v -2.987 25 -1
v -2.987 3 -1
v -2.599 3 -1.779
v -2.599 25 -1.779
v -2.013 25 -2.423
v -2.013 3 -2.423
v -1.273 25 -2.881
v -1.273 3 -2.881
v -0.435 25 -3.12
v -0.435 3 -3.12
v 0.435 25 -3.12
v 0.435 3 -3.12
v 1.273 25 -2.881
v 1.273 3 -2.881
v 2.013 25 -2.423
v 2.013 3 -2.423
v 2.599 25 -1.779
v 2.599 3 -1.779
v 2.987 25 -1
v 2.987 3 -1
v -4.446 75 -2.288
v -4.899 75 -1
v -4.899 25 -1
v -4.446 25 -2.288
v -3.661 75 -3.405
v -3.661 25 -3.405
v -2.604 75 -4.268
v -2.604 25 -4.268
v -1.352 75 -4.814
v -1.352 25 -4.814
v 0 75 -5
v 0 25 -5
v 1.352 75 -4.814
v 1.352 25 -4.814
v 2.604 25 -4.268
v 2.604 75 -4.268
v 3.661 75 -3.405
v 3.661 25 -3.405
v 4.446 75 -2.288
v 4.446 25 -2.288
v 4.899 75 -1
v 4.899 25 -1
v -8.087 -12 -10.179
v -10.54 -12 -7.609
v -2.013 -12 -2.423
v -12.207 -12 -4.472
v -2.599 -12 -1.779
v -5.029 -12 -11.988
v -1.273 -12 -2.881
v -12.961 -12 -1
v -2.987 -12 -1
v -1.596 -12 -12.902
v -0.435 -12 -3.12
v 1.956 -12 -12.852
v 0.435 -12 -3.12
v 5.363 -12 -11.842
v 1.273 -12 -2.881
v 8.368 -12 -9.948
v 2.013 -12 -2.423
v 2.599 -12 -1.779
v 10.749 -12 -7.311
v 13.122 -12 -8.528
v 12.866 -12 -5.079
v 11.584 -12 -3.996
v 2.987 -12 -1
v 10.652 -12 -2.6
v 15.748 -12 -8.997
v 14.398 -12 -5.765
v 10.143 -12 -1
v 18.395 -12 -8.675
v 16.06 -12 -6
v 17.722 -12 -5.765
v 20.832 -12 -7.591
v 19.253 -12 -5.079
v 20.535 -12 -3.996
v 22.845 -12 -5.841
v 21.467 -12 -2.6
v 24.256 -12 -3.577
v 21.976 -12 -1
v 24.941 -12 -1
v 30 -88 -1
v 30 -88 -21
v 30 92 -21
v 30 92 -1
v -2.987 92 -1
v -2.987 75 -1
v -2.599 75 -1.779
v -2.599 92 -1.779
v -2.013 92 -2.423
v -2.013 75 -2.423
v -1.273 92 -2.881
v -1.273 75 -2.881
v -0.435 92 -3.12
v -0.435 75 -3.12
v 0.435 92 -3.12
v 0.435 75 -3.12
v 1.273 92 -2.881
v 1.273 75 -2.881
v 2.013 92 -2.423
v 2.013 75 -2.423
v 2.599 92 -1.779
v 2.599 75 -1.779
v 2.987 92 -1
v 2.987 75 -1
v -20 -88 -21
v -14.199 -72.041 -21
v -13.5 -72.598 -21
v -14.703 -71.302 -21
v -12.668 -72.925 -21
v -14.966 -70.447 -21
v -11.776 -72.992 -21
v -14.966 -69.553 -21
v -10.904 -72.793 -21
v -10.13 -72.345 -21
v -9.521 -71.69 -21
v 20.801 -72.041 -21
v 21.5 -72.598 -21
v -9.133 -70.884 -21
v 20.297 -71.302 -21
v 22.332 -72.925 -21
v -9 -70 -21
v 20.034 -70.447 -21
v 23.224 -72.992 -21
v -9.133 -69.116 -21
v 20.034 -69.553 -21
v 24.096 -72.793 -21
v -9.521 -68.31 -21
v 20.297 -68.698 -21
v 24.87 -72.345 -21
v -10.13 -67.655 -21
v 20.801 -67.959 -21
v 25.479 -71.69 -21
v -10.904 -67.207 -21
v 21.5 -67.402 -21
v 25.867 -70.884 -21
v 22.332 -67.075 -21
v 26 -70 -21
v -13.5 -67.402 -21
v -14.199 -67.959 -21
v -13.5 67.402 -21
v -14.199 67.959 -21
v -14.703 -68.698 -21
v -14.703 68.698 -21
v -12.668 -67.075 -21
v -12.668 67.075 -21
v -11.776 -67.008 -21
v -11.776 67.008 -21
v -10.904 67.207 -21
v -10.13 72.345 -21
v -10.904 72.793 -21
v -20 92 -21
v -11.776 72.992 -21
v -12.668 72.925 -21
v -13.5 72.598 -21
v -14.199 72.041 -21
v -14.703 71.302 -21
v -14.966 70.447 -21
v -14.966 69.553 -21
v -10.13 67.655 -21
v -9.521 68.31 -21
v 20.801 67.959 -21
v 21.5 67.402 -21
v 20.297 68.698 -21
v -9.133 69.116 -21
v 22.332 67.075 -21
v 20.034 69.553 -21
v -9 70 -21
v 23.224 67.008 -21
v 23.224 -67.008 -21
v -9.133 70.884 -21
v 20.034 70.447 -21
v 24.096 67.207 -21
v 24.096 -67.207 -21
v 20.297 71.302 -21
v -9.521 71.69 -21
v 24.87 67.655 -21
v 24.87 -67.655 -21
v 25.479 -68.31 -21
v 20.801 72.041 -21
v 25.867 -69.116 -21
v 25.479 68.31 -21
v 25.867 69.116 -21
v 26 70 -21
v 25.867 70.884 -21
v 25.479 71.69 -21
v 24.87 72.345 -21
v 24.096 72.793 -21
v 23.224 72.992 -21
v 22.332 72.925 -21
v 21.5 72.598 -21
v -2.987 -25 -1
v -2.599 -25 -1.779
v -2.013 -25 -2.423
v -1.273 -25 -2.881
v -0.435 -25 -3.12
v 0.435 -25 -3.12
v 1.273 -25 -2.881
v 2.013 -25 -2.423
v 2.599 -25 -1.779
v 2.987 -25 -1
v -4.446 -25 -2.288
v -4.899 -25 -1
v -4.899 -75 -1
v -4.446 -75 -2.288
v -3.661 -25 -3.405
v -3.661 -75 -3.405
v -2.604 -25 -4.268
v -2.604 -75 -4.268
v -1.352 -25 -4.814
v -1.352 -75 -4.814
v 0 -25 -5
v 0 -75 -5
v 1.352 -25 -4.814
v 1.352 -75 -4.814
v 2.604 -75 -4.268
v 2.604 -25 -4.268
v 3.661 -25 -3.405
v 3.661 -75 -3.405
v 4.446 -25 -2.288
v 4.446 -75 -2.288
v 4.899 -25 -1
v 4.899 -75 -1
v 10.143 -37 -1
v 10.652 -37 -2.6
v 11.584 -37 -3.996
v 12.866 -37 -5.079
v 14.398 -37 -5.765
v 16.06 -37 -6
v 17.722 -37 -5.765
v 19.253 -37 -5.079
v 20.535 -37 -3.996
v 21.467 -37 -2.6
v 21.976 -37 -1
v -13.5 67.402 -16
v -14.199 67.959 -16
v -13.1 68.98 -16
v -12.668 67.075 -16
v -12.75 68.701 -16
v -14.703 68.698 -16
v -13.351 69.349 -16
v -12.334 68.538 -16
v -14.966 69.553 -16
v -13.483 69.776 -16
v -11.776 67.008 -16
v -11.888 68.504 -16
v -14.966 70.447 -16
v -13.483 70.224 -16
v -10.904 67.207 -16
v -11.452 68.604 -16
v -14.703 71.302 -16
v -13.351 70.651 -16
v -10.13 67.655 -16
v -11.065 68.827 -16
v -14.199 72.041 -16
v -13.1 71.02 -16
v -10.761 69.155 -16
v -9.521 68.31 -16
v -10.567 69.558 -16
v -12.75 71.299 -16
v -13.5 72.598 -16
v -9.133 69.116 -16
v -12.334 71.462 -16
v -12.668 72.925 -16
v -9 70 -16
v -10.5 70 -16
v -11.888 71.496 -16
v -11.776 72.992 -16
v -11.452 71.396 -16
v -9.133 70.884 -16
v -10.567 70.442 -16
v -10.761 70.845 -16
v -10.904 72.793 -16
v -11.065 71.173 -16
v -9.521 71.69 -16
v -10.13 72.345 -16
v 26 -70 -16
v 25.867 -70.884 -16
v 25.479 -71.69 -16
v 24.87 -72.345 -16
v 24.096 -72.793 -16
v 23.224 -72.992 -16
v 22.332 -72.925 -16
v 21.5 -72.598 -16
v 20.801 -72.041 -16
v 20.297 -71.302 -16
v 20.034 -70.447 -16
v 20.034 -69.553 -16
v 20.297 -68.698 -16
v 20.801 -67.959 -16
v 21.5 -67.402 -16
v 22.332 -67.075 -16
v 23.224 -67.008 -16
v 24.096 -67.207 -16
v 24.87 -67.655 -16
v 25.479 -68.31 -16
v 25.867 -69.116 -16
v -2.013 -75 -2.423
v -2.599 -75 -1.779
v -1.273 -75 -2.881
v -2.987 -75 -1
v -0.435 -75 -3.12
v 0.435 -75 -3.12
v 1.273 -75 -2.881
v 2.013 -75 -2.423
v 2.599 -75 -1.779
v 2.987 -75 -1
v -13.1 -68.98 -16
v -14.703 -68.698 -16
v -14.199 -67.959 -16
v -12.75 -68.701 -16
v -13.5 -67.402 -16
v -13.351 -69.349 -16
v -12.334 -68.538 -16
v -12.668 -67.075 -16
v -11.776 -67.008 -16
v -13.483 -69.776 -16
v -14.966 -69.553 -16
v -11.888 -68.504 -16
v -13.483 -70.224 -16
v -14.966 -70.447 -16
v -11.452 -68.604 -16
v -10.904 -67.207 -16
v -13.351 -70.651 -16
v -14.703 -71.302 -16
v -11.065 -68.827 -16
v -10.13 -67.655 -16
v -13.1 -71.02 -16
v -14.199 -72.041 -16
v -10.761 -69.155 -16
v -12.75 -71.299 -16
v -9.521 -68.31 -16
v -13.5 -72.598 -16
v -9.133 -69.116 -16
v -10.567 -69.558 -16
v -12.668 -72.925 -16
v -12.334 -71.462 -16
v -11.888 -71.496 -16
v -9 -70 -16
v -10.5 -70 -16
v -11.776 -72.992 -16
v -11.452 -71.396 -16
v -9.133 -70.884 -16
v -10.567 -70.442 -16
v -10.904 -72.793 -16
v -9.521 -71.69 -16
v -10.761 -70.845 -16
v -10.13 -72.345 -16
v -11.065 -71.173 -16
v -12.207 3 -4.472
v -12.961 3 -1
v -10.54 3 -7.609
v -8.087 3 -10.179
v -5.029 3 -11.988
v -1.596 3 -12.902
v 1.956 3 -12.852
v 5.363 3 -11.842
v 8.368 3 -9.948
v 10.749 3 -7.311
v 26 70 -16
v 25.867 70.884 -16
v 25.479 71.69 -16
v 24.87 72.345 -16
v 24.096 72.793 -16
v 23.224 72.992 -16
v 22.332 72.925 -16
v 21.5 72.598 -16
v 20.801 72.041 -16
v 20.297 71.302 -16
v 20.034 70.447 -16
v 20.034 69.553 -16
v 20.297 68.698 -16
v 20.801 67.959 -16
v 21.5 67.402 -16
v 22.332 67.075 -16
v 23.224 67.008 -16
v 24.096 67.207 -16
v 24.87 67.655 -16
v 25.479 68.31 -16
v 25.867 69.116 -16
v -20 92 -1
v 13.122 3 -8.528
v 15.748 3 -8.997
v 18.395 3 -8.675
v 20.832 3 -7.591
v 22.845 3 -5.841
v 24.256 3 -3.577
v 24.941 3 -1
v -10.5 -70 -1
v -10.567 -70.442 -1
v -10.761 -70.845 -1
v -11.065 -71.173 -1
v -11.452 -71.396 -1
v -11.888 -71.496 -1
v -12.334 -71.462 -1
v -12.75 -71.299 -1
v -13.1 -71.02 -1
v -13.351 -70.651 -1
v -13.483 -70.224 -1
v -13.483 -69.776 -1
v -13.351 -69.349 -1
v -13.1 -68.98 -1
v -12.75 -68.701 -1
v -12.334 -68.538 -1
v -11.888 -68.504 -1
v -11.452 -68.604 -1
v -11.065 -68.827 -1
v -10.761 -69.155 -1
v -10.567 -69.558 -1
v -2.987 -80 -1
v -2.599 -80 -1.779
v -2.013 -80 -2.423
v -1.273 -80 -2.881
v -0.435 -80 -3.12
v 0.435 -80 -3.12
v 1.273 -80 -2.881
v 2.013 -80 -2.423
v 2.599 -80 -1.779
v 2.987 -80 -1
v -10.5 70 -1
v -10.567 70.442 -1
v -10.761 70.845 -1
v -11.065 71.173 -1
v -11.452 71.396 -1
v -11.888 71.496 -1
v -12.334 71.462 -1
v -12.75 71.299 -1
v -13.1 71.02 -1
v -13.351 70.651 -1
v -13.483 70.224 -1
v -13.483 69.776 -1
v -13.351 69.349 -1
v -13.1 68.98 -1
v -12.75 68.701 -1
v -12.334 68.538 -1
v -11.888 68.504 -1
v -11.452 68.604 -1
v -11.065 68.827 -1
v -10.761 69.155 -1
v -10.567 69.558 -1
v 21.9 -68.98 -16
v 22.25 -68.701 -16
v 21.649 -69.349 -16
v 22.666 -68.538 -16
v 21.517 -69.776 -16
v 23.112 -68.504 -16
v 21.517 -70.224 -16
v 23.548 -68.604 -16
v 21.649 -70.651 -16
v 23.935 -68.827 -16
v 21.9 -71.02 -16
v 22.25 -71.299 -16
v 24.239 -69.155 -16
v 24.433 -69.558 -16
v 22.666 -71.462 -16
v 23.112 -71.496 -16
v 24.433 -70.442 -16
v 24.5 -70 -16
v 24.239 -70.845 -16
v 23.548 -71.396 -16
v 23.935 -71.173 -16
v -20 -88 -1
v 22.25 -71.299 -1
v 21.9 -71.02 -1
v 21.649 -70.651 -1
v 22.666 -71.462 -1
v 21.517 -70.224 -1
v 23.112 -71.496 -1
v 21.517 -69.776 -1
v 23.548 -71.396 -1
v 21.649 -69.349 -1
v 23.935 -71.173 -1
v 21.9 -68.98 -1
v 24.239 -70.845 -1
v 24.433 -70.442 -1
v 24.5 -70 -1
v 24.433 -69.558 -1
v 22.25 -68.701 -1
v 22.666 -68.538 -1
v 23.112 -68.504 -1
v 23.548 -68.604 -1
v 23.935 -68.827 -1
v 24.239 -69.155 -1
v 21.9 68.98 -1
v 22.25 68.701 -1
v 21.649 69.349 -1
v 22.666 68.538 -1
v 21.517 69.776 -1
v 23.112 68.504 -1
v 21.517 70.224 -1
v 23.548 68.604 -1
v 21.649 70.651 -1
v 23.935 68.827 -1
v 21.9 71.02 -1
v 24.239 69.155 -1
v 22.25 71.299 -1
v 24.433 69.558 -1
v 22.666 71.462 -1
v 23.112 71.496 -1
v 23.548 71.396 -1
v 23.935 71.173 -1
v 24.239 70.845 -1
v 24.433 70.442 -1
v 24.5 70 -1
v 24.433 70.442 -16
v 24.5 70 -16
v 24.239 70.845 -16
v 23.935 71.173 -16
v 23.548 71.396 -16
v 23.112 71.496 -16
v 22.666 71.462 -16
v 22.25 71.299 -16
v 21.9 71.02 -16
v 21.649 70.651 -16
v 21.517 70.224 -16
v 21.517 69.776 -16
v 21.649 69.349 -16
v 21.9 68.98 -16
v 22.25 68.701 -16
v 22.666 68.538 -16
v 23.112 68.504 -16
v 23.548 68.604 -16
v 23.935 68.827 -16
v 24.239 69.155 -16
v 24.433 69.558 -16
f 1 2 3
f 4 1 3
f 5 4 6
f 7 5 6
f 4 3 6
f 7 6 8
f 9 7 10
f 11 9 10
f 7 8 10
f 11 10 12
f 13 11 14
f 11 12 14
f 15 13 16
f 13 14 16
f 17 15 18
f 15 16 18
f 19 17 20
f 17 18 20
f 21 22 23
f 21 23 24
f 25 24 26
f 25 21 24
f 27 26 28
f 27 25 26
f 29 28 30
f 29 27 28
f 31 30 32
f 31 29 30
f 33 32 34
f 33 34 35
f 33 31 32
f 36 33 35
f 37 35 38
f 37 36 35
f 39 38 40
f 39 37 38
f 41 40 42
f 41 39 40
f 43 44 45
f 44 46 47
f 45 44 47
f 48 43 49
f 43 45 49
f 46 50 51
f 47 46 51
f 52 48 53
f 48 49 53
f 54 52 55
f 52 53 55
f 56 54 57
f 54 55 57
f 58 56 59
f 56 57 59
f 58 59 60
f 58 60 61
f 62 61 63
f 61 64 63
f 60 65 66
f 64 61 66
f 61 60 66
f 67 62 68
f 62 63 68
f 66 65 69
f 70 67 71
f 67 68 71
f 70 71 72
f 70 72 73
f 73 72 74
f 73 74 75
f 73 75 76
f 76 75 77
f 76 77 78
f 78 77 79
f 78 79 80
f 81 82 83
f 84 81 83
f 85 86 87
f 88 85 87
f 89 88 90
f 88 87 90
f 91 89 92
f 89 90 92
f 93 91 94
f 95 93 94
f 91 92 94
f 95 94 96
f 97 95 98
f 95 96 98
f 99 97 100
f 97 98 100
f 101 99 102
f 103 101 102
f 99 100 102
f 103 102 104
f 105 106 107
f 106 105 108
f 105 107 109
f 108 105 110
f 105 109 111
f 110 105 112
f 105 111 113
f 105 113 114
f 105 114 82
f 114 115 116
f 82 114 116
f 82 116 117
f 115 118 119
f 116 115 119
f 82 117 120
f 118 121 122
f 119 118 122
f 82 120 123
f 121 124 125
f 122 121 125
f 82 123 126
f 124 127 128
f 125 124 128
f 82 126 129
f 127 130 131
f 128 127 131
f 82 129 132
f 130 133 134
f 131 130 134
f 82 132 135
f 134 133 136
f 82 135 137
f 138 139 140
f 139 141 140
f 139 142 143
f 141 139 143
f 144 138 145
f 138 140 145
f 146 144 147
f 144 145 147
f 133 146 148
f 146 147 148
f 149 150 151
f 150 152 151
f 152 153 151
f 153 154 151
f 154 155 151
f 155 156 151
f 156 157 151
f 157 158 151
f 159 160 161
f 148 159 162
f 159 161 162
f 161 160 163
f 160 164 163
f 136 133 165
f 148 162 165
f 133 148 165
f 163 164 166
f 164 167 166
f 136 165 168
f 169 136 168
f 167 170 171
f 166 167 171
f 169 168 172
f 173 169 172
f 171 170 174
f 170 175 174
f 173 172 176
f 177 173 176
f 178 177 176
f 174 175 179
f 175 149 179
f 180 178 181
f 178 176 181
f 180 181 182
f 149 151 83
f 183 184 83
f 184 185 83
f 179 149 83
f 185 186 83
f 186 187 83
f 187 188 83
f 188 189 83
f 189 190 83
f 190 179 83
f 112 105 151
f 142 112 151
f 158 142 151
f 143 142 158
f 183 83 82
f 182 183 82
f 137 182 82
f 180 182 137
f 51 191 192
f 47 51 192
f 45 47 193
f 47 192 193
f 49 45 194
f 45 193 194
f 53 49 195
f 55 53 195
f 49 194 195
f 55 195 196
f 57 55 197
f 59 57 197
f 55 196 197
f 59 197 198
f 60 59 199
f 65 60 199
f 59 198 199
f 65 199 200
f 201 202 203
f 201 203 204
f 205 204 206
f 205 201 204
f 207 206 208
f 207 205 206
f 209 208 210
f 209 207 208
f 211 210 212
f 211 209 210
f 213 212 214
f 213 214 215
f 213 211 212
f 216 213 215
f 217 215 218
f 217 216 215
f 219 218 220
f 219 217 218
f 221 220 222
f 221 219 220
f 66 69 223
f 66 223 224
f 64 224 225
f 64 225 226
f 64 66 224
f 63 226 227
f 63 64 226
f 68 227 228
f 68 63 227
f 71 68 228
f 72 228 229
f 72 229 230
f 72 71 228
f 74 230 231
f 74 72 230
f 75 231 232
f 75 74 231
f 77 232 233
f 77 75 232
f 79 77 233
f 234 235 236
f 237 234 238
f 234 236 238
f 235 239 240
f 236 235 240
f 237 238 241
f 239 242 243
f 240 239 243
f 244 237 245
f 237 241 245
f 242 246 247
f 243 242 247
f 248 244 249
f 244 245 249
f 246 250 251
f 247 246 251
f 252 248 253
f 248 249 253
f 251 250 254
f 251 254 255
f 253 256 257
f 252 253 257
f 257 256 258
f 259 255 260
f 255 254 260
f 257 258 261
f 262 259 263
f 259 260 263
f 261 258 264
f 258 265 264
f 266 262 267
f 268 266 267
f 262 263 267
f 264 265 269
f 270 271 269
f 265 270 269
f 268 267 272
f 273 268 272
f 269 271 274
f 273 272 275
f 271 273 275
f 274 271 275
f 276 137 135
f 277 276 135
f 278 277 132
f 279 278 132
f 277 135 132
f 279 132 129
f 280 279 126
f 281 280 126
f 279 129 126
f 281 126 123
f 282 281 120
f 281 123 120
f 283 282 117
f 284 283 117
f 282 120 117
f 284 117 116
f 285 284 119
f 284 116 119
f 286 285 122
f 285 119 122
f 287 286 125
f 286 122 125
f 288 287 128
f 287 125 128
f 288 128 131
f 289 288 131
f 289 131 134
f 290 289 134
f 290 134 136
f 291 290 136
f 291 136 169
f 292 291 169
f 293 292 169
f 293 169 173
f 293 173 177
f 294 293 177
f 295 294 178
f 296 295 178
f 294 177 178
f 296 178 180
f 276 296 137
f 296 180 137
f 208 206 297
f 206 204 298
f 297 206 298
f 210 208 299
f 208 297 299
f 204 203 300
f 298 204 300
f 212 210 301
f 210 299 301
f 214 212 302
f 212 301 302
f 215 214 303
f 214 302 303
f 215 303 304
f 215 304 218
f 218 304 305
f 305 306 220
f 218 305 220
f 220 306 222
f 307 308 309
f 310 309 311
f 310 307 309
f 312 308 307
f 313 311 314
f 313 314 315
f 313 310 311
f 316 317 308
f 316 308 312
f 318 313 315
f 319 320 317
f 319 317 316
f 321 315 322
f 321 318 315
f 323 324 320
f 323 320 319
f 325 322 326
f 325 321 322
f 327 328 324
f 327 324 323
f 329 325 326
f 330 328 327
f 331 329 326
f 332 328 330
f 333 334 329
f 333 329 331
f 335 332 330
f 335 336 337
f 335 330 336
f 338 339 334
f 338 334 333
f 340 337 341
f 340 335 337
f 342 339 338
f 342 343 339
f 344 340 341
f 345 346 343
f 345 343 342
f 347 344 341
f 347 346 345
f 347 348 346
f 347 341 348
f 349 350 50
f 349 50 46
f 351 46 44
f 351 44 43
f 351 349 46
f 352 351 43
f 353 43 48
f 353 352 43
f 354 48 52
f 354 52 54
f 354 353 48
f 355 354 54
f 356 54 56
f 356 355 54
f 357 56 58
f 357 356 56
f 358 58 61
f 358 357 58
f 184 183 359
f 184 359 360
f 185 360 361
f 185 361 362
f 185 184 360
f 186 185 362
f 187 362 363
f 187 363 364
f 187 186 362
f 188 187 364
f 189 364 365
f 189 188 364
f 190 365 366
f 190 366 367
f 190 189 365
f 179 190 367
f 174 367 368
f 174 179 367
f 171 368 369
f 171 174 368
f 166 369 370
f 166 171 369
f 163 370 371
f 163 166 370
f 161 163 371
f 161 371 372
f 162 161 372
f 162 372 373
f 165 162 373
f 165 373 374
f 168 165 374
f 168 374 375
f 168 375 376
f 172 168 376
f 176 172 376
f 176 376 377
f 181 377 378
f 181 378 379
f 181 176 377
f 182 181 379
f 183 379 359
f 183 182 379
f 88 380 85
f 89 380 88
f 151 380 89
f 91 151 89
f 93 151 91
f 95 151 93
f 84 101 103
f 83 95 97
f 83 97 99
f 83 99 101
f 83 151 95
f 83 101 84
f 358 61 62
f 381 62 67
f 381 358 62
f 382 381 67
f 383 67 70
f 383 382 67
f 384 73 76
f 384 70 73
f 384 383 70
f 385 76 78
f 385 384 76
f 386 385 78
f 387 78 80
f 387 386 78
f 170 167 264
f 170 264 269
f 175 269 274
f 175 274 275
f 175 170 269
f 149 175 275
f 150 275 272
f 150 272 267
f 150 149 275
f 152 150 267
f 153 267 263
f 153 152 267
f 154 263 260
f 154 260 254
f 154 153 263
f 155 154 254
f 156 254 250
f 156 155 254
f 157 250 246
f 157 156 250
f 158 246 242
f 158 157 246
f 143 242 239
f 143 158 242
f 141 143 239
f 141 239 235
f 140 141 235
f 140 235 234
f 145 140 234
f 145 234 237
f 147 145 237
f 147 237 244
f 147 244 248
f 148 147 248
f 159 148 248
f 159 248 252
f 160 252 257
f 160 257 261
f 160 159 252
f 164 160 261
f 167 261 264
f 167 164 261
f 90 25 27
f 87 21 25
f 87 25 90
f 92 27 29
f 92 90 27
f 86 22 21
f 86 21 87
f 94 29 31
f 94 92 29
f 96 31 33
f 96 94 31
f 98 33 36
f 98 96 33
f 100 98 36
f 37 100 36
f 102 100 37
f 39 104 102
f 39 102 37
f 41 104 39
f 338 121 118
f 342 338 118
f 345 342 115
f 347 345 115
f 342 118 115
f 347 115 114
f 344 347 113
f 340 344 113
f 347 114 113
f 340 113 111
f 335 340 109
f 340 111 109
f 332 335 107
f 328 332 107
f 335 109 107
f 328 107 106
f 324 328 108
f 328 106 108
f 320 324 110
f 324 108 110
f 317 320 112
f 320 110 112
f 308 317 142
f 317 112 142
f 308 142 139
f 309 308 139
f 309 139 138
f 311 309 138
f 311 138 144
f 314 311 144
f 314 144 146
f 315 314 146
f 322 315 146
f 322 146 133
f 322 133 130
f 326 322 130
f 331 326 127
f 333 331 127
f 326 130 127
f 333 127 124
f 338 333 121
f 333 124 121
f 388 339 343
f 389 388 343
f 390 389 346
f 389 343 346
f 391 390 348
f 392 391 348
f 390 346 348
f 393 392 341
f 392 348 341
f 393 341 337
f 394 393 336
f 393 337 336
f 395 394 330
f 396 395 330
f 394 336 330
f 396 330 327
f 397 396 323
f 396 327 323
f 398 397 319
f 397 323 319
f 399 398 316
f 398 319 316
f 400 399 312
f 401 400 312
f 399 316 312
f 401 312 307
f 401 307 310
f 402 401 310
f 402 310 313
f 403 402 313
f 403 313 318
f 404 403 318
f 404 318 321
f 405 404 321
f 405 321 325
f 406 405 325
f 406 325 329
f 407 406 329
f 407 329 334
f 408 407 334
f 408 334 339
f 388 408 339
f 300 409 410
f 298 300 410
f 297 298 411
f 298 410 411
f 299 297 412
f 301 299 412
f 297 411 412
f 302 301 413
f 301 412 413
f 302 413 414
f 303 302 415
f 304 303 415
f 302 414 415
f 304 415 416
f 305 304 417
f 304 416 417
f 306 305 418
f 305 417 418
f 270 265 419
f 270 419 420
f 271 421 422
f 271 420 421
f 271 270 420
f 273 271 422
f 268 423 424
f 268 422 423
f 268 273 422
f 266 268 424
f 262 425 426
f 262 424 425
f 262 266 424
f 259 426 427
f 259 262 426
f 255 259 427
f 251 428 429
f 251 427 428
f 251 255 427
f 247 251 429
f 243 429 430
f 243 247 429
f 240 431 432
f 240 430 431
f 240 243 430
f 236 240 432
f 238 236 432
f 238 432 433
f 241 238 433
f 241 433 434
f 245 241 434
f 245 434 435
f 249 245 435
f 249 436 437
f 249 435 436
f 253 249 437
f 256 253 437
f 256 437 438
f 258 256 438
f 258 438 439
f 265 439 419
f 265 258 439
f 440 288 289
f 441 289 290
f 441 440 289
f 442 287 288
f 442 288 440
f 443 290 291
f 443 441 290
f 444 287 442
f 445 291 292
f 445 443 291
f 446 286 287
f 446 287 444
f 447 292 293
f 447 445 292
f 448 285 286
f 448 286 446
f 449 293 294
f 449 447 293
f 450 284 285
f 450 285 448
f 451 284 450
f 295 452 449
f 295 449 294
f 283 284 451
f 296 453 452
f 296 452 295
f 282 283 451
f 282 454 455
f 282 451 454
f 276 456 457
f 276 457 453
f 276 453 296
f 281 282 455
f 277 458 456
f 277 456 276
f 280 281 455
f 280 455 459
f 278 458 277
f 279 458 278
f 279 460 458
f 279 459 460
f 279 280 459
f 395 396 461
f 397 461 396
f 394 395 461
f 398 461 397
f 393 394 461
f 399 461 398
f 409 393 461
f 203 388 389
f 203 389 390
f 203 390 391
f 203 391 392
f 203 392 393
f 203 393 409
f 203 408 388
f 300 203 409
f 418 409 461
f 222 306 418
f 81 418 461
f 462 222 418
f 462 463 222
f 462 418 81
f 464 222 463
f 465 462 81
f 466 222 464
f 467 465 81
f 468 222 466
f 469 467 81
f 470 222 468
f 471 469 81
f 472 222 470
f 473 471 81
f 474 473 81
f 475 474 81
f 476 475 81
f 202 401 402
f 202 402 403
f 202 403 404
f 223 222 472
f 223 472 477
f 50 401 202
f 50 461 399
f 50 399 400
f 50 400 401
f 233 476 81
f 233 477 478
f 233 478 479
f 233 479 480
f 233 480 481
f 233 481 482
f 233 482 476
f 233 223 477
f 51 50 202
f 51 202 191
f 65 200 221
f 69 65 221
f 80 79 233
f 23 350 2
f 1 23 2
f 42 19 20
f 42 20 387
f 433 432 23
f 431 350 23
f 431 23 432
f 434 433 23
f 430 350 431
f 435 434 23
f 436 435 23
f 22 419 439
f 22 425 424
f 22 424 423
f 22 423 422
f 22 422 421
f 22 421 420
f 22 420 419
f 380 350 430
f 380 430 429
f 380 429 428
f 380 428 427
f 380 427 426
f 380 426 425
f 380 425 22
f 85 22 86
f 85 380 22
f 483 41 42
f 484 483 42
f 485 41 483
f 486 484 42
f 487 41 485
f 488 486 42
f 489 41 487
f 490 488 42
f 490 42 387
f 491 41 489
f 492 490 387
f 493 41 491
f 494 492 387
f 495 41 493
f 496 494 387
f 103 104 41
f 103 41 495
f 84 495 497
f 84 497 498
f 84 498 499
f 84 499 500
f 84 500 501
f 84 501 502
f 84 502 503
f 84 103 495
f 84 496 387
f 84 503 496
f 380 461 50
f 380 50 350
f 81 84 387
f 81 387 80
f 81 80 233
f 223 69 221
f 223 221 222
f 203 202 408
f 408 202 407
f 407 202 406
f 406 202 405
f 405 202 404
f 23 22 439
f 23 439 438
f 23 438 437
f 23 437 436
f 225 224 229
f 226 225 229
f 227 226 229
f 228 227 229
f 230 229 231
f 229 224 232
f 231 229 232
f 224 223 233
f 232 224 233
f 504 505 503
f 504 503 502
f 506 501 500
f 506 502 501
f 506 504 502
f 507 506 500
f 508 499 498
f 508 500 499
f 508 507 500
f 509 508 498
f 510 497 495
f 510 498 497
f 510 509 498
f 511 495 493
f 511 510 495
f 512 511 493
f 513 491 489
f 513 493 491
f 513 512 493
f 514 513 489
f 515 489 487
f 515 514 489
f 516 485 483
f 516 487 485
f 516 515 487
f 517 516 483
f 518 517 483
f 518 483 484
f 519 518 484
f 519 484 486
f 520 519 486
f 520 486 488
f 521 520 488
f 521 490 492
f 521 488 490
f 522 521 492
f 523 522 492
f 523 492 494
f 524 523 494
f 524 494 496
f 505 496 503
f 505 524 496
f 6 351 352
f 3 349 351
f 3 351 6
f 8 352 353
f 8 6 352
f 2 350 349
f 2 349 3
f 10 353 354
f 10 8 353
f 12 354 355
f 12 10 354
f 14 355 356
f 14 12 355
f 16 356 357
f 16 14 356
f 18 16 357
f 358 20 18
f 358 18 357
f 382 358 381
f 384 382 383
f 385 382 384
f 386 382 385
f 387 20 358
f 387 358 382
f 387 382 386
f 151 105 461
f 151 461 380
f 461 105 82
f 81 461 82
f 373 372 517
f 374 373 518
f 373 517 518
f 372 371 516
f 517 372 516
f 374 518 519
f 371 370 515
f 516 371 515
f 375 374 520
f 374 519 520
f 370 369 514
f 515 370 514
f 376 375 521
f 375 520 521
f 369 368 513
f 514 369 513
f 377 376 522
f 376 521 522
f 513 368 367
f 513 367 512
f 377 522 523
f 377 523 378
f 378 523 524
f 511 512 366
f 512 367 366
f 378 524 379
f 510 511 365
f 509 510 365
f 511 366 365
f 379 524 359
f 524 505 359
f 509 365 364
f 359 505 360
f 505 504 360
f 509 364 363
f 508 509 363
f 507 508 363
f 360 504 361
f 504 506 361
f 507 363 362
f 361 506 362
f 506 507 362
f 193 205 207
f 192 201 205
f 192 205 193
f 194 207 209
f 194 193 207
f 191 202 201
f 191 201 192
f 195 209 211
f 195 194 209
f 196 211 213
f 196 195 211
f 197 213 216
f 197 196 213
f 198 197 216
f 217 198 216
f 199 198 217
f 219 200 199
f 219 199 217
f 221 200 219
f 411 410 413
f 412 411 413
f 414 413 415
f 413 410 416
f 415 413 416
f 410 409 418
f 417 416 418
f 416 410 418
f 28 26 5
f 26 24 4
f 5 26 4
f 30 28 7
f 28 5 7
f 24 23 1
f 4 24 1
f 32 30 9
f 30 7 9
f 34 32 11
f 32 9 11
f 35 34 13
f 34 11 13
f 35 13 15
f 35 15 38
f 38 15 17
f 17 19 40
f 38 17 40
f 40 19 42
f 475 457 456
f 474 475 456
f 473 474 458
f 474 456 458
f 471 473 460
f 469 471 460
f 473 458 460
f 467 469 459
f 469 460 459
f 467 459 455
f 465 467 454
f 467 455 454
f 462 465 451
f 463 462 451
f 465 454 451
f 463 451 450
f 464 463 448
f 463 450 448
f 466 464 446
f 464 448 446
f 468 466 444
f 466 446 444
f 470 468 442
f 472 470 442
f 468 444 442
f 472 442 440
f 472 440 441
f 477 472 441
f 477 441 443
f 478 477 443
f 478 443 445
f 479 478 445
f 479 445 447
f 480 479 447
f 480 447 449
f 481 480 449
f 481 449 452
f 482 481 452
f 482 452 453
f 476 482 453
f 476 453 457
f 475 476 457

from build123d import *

# Parameters (mm, degrees)
SKETCH006_R     = 3.15
PAD002_DEPTH    = 190
SKETCH011_R     = 5
PAD007_DEPTH    = 50
SKETCH010_R     = 5
PAD006_DEPTH    = 50
SKETCH008_R     = 13
PAD004_DEPTH    = 15
SKETCH009_R     = 9
PAD005_DEPTH    = 15
SKETCH013_R     = 6
PAD008_DEPTH    = 26
BOX001_W        = 50
BOX001_H        = 180
BOX001_DEPTH    = 20
SKETCH015_R     = 1.5
POCKET001_DEPTH = 395.766885
SKETCH016_R     = 1.5
POCKET002_DEPTH = 395.766885
SKETCH017_R     = 3
POCKET003_DEPTH = 5
SKETCH018_R     = 3
POCKET004_DEPTH = 5


with BuildPart() as pad002:
    # Sketch006 → Pad002 (new body)
    with BuildSketch(Plane.XZ.offset(80)):
        Circle(SKETCH006_R)
    extrude(amount=-PAD002_DEPTH)


with BuildPart() as pad007:
    # Sketch011 → Pad007 (new body)
    with BuildSketch(Plane.XZ.offset(-75)):
        Circle(SKETCH011_R)
    extrude(amount=PAD007_DEPTH)


with BuildPart() as scassi_perno:
    # Sketch010 → Pad006 (new body)
    with BuildSketch(Plane.XZ.offset(25)):
        Circle(SKETCH010_R)
    extrude(amount=PAD006_DEPTH)

    # Fusion002: union Pad007
    add(pad007.part)


with BuildPart() as scasso_ruota_dentata:
    # Sketch008 → Pad004 (new body)
    with BuildSketch(Plane.XZ.offset(-3)):
        Circle(SKETCH008_R)
    extrude(amount=PAD004_DEPTH)


with BuildPart() as scassi_ruote_dentate:
    # Sketch009 → Pad005 (new body)
    with BuildSketch(Plane.XZ.offset(-3)):
        with Locations((15.997087, 9e-06)):
            Circle(SKETCH009_R)
    extrude(amount=PAD005_DEPTH)

    # Fusion001: union scasso_ruota_dentata
    add(scasso_ruota_dentata.part)


with BuildPart() as fusion:
    # Sketch013 → Pad008 (new body)
    with BuildSketch(Plane.XZ.offset(11)):
        with Locations((16.059561, 9e-06)):
            Circle(SKETCH013_R)
    extrude(amount=PAD008_DEPTH)

    # Fusion005: union scassi_perno, scassi_ruote_dentate
    add(scassi_perno.part)
    add(scassi_ruote_dentate.part)

    # Fusion: union Pad002
    add(pad002.part)


with BuildPart() as tappo_viti:
    # Box001 → Box001 (new body)
    with BuildSketch(Plane(origin=(-20, -88, -21), x_dir=(1, 0, 0), z_dir=(0, 0, 1))):
        with Locations((25, 90)):
            Rectangle(BOX001_W, BOX001_H)
    extrude(amount=BOX001_DEPTH)

    # Cut001: cut Fusion
    add(fusion.part, mode=Mode.SUBTRACT)

    # Sketch015 → Pocket001 (cut, through all)
    with BuildSketch(Plane(origin=(0, 0, -21), x_dir=(1, 0, 0), z_dir=(0, 0, -1))):
        with Locations((23, 70)):
            Circle(SKETCH015_R)
    pocket001 = extrude(amount=-POCKET001_DEPTH, mode=Mode.SUBTRACT)

    # Mirrored: Pocket001 across Sketch015 H_Axis
    add(pocket001.mirror(Plane(origin=(0, 0, -21), x_dir=(0, 0, -1), z_dir=(0, -1, 0))), mode=Mode.SUBTRACT)

    # Sketch016 → Pocket002 (cut, through all)
    with BuildSketch(Plane(origin=(0, 0, -21), x_dir=(1, 0, 0), z_dir=(0, 0, -1))):
        with Locations((-12, 70)):
            Circle(SKETCH016_R)
    pocket002 = extrude(amount=-POCKET002_DEPTH, mode=Mode.SUBTRACT)

    # Mirrored001: Pocket002 across Sketch016 H_Axis
    add(pocket002.mirror(Plane(origin=(0, 0, -21), x_dir=(0, 0, -1), z_dir=(0, -1, 0))), mode=Mode.SUBTRACT)

    # Sketch017 → Pocket003 (cut)
    with BuildSketch(Plane(origin=(0, 0, -21), x_dir=(1, 0, 0), z_dir=(0, 0, -1))):
        with Locations((23, 70)):
            Circle(SKETCH017_R)
    pocket003 = extrude(amount=-POCKET003_DEPTH, mode=Mode.SUBTRACT)

    # Mirrored002: Pocket003 across Sketch017 H_Axis
    add(pocket003.mirror(Plane(origin=(0, 0, -21), x_dir=(0, 0, -1), z_dir=(0, -1, 0))), mode=Mode.SUBTRACT)

    # Sketch018 → Pocket004 (cut)
    with BuildSketch(Plane(origin=(0, 0, -21), x_dir=(1, 0, 0), z_dir=(0, 0, -1))):
        with Locations((-12, 70)):
            Circle(SKETCH018_R)
    pocket004 = extrude(amount=-POCKET004_DEPTH, mode=Mode.SUBTRACT)

    # Mirrored003: Pocket004 across Sketch018 H_Axis
    add(pocket004.mirror(Plane(origin=(0, 0, -21), x_dir=(0, 0, -1), z_dir=(0, -1, 0))), mode=Mode.SUBTRACT)


solid = tappo_viti.part
